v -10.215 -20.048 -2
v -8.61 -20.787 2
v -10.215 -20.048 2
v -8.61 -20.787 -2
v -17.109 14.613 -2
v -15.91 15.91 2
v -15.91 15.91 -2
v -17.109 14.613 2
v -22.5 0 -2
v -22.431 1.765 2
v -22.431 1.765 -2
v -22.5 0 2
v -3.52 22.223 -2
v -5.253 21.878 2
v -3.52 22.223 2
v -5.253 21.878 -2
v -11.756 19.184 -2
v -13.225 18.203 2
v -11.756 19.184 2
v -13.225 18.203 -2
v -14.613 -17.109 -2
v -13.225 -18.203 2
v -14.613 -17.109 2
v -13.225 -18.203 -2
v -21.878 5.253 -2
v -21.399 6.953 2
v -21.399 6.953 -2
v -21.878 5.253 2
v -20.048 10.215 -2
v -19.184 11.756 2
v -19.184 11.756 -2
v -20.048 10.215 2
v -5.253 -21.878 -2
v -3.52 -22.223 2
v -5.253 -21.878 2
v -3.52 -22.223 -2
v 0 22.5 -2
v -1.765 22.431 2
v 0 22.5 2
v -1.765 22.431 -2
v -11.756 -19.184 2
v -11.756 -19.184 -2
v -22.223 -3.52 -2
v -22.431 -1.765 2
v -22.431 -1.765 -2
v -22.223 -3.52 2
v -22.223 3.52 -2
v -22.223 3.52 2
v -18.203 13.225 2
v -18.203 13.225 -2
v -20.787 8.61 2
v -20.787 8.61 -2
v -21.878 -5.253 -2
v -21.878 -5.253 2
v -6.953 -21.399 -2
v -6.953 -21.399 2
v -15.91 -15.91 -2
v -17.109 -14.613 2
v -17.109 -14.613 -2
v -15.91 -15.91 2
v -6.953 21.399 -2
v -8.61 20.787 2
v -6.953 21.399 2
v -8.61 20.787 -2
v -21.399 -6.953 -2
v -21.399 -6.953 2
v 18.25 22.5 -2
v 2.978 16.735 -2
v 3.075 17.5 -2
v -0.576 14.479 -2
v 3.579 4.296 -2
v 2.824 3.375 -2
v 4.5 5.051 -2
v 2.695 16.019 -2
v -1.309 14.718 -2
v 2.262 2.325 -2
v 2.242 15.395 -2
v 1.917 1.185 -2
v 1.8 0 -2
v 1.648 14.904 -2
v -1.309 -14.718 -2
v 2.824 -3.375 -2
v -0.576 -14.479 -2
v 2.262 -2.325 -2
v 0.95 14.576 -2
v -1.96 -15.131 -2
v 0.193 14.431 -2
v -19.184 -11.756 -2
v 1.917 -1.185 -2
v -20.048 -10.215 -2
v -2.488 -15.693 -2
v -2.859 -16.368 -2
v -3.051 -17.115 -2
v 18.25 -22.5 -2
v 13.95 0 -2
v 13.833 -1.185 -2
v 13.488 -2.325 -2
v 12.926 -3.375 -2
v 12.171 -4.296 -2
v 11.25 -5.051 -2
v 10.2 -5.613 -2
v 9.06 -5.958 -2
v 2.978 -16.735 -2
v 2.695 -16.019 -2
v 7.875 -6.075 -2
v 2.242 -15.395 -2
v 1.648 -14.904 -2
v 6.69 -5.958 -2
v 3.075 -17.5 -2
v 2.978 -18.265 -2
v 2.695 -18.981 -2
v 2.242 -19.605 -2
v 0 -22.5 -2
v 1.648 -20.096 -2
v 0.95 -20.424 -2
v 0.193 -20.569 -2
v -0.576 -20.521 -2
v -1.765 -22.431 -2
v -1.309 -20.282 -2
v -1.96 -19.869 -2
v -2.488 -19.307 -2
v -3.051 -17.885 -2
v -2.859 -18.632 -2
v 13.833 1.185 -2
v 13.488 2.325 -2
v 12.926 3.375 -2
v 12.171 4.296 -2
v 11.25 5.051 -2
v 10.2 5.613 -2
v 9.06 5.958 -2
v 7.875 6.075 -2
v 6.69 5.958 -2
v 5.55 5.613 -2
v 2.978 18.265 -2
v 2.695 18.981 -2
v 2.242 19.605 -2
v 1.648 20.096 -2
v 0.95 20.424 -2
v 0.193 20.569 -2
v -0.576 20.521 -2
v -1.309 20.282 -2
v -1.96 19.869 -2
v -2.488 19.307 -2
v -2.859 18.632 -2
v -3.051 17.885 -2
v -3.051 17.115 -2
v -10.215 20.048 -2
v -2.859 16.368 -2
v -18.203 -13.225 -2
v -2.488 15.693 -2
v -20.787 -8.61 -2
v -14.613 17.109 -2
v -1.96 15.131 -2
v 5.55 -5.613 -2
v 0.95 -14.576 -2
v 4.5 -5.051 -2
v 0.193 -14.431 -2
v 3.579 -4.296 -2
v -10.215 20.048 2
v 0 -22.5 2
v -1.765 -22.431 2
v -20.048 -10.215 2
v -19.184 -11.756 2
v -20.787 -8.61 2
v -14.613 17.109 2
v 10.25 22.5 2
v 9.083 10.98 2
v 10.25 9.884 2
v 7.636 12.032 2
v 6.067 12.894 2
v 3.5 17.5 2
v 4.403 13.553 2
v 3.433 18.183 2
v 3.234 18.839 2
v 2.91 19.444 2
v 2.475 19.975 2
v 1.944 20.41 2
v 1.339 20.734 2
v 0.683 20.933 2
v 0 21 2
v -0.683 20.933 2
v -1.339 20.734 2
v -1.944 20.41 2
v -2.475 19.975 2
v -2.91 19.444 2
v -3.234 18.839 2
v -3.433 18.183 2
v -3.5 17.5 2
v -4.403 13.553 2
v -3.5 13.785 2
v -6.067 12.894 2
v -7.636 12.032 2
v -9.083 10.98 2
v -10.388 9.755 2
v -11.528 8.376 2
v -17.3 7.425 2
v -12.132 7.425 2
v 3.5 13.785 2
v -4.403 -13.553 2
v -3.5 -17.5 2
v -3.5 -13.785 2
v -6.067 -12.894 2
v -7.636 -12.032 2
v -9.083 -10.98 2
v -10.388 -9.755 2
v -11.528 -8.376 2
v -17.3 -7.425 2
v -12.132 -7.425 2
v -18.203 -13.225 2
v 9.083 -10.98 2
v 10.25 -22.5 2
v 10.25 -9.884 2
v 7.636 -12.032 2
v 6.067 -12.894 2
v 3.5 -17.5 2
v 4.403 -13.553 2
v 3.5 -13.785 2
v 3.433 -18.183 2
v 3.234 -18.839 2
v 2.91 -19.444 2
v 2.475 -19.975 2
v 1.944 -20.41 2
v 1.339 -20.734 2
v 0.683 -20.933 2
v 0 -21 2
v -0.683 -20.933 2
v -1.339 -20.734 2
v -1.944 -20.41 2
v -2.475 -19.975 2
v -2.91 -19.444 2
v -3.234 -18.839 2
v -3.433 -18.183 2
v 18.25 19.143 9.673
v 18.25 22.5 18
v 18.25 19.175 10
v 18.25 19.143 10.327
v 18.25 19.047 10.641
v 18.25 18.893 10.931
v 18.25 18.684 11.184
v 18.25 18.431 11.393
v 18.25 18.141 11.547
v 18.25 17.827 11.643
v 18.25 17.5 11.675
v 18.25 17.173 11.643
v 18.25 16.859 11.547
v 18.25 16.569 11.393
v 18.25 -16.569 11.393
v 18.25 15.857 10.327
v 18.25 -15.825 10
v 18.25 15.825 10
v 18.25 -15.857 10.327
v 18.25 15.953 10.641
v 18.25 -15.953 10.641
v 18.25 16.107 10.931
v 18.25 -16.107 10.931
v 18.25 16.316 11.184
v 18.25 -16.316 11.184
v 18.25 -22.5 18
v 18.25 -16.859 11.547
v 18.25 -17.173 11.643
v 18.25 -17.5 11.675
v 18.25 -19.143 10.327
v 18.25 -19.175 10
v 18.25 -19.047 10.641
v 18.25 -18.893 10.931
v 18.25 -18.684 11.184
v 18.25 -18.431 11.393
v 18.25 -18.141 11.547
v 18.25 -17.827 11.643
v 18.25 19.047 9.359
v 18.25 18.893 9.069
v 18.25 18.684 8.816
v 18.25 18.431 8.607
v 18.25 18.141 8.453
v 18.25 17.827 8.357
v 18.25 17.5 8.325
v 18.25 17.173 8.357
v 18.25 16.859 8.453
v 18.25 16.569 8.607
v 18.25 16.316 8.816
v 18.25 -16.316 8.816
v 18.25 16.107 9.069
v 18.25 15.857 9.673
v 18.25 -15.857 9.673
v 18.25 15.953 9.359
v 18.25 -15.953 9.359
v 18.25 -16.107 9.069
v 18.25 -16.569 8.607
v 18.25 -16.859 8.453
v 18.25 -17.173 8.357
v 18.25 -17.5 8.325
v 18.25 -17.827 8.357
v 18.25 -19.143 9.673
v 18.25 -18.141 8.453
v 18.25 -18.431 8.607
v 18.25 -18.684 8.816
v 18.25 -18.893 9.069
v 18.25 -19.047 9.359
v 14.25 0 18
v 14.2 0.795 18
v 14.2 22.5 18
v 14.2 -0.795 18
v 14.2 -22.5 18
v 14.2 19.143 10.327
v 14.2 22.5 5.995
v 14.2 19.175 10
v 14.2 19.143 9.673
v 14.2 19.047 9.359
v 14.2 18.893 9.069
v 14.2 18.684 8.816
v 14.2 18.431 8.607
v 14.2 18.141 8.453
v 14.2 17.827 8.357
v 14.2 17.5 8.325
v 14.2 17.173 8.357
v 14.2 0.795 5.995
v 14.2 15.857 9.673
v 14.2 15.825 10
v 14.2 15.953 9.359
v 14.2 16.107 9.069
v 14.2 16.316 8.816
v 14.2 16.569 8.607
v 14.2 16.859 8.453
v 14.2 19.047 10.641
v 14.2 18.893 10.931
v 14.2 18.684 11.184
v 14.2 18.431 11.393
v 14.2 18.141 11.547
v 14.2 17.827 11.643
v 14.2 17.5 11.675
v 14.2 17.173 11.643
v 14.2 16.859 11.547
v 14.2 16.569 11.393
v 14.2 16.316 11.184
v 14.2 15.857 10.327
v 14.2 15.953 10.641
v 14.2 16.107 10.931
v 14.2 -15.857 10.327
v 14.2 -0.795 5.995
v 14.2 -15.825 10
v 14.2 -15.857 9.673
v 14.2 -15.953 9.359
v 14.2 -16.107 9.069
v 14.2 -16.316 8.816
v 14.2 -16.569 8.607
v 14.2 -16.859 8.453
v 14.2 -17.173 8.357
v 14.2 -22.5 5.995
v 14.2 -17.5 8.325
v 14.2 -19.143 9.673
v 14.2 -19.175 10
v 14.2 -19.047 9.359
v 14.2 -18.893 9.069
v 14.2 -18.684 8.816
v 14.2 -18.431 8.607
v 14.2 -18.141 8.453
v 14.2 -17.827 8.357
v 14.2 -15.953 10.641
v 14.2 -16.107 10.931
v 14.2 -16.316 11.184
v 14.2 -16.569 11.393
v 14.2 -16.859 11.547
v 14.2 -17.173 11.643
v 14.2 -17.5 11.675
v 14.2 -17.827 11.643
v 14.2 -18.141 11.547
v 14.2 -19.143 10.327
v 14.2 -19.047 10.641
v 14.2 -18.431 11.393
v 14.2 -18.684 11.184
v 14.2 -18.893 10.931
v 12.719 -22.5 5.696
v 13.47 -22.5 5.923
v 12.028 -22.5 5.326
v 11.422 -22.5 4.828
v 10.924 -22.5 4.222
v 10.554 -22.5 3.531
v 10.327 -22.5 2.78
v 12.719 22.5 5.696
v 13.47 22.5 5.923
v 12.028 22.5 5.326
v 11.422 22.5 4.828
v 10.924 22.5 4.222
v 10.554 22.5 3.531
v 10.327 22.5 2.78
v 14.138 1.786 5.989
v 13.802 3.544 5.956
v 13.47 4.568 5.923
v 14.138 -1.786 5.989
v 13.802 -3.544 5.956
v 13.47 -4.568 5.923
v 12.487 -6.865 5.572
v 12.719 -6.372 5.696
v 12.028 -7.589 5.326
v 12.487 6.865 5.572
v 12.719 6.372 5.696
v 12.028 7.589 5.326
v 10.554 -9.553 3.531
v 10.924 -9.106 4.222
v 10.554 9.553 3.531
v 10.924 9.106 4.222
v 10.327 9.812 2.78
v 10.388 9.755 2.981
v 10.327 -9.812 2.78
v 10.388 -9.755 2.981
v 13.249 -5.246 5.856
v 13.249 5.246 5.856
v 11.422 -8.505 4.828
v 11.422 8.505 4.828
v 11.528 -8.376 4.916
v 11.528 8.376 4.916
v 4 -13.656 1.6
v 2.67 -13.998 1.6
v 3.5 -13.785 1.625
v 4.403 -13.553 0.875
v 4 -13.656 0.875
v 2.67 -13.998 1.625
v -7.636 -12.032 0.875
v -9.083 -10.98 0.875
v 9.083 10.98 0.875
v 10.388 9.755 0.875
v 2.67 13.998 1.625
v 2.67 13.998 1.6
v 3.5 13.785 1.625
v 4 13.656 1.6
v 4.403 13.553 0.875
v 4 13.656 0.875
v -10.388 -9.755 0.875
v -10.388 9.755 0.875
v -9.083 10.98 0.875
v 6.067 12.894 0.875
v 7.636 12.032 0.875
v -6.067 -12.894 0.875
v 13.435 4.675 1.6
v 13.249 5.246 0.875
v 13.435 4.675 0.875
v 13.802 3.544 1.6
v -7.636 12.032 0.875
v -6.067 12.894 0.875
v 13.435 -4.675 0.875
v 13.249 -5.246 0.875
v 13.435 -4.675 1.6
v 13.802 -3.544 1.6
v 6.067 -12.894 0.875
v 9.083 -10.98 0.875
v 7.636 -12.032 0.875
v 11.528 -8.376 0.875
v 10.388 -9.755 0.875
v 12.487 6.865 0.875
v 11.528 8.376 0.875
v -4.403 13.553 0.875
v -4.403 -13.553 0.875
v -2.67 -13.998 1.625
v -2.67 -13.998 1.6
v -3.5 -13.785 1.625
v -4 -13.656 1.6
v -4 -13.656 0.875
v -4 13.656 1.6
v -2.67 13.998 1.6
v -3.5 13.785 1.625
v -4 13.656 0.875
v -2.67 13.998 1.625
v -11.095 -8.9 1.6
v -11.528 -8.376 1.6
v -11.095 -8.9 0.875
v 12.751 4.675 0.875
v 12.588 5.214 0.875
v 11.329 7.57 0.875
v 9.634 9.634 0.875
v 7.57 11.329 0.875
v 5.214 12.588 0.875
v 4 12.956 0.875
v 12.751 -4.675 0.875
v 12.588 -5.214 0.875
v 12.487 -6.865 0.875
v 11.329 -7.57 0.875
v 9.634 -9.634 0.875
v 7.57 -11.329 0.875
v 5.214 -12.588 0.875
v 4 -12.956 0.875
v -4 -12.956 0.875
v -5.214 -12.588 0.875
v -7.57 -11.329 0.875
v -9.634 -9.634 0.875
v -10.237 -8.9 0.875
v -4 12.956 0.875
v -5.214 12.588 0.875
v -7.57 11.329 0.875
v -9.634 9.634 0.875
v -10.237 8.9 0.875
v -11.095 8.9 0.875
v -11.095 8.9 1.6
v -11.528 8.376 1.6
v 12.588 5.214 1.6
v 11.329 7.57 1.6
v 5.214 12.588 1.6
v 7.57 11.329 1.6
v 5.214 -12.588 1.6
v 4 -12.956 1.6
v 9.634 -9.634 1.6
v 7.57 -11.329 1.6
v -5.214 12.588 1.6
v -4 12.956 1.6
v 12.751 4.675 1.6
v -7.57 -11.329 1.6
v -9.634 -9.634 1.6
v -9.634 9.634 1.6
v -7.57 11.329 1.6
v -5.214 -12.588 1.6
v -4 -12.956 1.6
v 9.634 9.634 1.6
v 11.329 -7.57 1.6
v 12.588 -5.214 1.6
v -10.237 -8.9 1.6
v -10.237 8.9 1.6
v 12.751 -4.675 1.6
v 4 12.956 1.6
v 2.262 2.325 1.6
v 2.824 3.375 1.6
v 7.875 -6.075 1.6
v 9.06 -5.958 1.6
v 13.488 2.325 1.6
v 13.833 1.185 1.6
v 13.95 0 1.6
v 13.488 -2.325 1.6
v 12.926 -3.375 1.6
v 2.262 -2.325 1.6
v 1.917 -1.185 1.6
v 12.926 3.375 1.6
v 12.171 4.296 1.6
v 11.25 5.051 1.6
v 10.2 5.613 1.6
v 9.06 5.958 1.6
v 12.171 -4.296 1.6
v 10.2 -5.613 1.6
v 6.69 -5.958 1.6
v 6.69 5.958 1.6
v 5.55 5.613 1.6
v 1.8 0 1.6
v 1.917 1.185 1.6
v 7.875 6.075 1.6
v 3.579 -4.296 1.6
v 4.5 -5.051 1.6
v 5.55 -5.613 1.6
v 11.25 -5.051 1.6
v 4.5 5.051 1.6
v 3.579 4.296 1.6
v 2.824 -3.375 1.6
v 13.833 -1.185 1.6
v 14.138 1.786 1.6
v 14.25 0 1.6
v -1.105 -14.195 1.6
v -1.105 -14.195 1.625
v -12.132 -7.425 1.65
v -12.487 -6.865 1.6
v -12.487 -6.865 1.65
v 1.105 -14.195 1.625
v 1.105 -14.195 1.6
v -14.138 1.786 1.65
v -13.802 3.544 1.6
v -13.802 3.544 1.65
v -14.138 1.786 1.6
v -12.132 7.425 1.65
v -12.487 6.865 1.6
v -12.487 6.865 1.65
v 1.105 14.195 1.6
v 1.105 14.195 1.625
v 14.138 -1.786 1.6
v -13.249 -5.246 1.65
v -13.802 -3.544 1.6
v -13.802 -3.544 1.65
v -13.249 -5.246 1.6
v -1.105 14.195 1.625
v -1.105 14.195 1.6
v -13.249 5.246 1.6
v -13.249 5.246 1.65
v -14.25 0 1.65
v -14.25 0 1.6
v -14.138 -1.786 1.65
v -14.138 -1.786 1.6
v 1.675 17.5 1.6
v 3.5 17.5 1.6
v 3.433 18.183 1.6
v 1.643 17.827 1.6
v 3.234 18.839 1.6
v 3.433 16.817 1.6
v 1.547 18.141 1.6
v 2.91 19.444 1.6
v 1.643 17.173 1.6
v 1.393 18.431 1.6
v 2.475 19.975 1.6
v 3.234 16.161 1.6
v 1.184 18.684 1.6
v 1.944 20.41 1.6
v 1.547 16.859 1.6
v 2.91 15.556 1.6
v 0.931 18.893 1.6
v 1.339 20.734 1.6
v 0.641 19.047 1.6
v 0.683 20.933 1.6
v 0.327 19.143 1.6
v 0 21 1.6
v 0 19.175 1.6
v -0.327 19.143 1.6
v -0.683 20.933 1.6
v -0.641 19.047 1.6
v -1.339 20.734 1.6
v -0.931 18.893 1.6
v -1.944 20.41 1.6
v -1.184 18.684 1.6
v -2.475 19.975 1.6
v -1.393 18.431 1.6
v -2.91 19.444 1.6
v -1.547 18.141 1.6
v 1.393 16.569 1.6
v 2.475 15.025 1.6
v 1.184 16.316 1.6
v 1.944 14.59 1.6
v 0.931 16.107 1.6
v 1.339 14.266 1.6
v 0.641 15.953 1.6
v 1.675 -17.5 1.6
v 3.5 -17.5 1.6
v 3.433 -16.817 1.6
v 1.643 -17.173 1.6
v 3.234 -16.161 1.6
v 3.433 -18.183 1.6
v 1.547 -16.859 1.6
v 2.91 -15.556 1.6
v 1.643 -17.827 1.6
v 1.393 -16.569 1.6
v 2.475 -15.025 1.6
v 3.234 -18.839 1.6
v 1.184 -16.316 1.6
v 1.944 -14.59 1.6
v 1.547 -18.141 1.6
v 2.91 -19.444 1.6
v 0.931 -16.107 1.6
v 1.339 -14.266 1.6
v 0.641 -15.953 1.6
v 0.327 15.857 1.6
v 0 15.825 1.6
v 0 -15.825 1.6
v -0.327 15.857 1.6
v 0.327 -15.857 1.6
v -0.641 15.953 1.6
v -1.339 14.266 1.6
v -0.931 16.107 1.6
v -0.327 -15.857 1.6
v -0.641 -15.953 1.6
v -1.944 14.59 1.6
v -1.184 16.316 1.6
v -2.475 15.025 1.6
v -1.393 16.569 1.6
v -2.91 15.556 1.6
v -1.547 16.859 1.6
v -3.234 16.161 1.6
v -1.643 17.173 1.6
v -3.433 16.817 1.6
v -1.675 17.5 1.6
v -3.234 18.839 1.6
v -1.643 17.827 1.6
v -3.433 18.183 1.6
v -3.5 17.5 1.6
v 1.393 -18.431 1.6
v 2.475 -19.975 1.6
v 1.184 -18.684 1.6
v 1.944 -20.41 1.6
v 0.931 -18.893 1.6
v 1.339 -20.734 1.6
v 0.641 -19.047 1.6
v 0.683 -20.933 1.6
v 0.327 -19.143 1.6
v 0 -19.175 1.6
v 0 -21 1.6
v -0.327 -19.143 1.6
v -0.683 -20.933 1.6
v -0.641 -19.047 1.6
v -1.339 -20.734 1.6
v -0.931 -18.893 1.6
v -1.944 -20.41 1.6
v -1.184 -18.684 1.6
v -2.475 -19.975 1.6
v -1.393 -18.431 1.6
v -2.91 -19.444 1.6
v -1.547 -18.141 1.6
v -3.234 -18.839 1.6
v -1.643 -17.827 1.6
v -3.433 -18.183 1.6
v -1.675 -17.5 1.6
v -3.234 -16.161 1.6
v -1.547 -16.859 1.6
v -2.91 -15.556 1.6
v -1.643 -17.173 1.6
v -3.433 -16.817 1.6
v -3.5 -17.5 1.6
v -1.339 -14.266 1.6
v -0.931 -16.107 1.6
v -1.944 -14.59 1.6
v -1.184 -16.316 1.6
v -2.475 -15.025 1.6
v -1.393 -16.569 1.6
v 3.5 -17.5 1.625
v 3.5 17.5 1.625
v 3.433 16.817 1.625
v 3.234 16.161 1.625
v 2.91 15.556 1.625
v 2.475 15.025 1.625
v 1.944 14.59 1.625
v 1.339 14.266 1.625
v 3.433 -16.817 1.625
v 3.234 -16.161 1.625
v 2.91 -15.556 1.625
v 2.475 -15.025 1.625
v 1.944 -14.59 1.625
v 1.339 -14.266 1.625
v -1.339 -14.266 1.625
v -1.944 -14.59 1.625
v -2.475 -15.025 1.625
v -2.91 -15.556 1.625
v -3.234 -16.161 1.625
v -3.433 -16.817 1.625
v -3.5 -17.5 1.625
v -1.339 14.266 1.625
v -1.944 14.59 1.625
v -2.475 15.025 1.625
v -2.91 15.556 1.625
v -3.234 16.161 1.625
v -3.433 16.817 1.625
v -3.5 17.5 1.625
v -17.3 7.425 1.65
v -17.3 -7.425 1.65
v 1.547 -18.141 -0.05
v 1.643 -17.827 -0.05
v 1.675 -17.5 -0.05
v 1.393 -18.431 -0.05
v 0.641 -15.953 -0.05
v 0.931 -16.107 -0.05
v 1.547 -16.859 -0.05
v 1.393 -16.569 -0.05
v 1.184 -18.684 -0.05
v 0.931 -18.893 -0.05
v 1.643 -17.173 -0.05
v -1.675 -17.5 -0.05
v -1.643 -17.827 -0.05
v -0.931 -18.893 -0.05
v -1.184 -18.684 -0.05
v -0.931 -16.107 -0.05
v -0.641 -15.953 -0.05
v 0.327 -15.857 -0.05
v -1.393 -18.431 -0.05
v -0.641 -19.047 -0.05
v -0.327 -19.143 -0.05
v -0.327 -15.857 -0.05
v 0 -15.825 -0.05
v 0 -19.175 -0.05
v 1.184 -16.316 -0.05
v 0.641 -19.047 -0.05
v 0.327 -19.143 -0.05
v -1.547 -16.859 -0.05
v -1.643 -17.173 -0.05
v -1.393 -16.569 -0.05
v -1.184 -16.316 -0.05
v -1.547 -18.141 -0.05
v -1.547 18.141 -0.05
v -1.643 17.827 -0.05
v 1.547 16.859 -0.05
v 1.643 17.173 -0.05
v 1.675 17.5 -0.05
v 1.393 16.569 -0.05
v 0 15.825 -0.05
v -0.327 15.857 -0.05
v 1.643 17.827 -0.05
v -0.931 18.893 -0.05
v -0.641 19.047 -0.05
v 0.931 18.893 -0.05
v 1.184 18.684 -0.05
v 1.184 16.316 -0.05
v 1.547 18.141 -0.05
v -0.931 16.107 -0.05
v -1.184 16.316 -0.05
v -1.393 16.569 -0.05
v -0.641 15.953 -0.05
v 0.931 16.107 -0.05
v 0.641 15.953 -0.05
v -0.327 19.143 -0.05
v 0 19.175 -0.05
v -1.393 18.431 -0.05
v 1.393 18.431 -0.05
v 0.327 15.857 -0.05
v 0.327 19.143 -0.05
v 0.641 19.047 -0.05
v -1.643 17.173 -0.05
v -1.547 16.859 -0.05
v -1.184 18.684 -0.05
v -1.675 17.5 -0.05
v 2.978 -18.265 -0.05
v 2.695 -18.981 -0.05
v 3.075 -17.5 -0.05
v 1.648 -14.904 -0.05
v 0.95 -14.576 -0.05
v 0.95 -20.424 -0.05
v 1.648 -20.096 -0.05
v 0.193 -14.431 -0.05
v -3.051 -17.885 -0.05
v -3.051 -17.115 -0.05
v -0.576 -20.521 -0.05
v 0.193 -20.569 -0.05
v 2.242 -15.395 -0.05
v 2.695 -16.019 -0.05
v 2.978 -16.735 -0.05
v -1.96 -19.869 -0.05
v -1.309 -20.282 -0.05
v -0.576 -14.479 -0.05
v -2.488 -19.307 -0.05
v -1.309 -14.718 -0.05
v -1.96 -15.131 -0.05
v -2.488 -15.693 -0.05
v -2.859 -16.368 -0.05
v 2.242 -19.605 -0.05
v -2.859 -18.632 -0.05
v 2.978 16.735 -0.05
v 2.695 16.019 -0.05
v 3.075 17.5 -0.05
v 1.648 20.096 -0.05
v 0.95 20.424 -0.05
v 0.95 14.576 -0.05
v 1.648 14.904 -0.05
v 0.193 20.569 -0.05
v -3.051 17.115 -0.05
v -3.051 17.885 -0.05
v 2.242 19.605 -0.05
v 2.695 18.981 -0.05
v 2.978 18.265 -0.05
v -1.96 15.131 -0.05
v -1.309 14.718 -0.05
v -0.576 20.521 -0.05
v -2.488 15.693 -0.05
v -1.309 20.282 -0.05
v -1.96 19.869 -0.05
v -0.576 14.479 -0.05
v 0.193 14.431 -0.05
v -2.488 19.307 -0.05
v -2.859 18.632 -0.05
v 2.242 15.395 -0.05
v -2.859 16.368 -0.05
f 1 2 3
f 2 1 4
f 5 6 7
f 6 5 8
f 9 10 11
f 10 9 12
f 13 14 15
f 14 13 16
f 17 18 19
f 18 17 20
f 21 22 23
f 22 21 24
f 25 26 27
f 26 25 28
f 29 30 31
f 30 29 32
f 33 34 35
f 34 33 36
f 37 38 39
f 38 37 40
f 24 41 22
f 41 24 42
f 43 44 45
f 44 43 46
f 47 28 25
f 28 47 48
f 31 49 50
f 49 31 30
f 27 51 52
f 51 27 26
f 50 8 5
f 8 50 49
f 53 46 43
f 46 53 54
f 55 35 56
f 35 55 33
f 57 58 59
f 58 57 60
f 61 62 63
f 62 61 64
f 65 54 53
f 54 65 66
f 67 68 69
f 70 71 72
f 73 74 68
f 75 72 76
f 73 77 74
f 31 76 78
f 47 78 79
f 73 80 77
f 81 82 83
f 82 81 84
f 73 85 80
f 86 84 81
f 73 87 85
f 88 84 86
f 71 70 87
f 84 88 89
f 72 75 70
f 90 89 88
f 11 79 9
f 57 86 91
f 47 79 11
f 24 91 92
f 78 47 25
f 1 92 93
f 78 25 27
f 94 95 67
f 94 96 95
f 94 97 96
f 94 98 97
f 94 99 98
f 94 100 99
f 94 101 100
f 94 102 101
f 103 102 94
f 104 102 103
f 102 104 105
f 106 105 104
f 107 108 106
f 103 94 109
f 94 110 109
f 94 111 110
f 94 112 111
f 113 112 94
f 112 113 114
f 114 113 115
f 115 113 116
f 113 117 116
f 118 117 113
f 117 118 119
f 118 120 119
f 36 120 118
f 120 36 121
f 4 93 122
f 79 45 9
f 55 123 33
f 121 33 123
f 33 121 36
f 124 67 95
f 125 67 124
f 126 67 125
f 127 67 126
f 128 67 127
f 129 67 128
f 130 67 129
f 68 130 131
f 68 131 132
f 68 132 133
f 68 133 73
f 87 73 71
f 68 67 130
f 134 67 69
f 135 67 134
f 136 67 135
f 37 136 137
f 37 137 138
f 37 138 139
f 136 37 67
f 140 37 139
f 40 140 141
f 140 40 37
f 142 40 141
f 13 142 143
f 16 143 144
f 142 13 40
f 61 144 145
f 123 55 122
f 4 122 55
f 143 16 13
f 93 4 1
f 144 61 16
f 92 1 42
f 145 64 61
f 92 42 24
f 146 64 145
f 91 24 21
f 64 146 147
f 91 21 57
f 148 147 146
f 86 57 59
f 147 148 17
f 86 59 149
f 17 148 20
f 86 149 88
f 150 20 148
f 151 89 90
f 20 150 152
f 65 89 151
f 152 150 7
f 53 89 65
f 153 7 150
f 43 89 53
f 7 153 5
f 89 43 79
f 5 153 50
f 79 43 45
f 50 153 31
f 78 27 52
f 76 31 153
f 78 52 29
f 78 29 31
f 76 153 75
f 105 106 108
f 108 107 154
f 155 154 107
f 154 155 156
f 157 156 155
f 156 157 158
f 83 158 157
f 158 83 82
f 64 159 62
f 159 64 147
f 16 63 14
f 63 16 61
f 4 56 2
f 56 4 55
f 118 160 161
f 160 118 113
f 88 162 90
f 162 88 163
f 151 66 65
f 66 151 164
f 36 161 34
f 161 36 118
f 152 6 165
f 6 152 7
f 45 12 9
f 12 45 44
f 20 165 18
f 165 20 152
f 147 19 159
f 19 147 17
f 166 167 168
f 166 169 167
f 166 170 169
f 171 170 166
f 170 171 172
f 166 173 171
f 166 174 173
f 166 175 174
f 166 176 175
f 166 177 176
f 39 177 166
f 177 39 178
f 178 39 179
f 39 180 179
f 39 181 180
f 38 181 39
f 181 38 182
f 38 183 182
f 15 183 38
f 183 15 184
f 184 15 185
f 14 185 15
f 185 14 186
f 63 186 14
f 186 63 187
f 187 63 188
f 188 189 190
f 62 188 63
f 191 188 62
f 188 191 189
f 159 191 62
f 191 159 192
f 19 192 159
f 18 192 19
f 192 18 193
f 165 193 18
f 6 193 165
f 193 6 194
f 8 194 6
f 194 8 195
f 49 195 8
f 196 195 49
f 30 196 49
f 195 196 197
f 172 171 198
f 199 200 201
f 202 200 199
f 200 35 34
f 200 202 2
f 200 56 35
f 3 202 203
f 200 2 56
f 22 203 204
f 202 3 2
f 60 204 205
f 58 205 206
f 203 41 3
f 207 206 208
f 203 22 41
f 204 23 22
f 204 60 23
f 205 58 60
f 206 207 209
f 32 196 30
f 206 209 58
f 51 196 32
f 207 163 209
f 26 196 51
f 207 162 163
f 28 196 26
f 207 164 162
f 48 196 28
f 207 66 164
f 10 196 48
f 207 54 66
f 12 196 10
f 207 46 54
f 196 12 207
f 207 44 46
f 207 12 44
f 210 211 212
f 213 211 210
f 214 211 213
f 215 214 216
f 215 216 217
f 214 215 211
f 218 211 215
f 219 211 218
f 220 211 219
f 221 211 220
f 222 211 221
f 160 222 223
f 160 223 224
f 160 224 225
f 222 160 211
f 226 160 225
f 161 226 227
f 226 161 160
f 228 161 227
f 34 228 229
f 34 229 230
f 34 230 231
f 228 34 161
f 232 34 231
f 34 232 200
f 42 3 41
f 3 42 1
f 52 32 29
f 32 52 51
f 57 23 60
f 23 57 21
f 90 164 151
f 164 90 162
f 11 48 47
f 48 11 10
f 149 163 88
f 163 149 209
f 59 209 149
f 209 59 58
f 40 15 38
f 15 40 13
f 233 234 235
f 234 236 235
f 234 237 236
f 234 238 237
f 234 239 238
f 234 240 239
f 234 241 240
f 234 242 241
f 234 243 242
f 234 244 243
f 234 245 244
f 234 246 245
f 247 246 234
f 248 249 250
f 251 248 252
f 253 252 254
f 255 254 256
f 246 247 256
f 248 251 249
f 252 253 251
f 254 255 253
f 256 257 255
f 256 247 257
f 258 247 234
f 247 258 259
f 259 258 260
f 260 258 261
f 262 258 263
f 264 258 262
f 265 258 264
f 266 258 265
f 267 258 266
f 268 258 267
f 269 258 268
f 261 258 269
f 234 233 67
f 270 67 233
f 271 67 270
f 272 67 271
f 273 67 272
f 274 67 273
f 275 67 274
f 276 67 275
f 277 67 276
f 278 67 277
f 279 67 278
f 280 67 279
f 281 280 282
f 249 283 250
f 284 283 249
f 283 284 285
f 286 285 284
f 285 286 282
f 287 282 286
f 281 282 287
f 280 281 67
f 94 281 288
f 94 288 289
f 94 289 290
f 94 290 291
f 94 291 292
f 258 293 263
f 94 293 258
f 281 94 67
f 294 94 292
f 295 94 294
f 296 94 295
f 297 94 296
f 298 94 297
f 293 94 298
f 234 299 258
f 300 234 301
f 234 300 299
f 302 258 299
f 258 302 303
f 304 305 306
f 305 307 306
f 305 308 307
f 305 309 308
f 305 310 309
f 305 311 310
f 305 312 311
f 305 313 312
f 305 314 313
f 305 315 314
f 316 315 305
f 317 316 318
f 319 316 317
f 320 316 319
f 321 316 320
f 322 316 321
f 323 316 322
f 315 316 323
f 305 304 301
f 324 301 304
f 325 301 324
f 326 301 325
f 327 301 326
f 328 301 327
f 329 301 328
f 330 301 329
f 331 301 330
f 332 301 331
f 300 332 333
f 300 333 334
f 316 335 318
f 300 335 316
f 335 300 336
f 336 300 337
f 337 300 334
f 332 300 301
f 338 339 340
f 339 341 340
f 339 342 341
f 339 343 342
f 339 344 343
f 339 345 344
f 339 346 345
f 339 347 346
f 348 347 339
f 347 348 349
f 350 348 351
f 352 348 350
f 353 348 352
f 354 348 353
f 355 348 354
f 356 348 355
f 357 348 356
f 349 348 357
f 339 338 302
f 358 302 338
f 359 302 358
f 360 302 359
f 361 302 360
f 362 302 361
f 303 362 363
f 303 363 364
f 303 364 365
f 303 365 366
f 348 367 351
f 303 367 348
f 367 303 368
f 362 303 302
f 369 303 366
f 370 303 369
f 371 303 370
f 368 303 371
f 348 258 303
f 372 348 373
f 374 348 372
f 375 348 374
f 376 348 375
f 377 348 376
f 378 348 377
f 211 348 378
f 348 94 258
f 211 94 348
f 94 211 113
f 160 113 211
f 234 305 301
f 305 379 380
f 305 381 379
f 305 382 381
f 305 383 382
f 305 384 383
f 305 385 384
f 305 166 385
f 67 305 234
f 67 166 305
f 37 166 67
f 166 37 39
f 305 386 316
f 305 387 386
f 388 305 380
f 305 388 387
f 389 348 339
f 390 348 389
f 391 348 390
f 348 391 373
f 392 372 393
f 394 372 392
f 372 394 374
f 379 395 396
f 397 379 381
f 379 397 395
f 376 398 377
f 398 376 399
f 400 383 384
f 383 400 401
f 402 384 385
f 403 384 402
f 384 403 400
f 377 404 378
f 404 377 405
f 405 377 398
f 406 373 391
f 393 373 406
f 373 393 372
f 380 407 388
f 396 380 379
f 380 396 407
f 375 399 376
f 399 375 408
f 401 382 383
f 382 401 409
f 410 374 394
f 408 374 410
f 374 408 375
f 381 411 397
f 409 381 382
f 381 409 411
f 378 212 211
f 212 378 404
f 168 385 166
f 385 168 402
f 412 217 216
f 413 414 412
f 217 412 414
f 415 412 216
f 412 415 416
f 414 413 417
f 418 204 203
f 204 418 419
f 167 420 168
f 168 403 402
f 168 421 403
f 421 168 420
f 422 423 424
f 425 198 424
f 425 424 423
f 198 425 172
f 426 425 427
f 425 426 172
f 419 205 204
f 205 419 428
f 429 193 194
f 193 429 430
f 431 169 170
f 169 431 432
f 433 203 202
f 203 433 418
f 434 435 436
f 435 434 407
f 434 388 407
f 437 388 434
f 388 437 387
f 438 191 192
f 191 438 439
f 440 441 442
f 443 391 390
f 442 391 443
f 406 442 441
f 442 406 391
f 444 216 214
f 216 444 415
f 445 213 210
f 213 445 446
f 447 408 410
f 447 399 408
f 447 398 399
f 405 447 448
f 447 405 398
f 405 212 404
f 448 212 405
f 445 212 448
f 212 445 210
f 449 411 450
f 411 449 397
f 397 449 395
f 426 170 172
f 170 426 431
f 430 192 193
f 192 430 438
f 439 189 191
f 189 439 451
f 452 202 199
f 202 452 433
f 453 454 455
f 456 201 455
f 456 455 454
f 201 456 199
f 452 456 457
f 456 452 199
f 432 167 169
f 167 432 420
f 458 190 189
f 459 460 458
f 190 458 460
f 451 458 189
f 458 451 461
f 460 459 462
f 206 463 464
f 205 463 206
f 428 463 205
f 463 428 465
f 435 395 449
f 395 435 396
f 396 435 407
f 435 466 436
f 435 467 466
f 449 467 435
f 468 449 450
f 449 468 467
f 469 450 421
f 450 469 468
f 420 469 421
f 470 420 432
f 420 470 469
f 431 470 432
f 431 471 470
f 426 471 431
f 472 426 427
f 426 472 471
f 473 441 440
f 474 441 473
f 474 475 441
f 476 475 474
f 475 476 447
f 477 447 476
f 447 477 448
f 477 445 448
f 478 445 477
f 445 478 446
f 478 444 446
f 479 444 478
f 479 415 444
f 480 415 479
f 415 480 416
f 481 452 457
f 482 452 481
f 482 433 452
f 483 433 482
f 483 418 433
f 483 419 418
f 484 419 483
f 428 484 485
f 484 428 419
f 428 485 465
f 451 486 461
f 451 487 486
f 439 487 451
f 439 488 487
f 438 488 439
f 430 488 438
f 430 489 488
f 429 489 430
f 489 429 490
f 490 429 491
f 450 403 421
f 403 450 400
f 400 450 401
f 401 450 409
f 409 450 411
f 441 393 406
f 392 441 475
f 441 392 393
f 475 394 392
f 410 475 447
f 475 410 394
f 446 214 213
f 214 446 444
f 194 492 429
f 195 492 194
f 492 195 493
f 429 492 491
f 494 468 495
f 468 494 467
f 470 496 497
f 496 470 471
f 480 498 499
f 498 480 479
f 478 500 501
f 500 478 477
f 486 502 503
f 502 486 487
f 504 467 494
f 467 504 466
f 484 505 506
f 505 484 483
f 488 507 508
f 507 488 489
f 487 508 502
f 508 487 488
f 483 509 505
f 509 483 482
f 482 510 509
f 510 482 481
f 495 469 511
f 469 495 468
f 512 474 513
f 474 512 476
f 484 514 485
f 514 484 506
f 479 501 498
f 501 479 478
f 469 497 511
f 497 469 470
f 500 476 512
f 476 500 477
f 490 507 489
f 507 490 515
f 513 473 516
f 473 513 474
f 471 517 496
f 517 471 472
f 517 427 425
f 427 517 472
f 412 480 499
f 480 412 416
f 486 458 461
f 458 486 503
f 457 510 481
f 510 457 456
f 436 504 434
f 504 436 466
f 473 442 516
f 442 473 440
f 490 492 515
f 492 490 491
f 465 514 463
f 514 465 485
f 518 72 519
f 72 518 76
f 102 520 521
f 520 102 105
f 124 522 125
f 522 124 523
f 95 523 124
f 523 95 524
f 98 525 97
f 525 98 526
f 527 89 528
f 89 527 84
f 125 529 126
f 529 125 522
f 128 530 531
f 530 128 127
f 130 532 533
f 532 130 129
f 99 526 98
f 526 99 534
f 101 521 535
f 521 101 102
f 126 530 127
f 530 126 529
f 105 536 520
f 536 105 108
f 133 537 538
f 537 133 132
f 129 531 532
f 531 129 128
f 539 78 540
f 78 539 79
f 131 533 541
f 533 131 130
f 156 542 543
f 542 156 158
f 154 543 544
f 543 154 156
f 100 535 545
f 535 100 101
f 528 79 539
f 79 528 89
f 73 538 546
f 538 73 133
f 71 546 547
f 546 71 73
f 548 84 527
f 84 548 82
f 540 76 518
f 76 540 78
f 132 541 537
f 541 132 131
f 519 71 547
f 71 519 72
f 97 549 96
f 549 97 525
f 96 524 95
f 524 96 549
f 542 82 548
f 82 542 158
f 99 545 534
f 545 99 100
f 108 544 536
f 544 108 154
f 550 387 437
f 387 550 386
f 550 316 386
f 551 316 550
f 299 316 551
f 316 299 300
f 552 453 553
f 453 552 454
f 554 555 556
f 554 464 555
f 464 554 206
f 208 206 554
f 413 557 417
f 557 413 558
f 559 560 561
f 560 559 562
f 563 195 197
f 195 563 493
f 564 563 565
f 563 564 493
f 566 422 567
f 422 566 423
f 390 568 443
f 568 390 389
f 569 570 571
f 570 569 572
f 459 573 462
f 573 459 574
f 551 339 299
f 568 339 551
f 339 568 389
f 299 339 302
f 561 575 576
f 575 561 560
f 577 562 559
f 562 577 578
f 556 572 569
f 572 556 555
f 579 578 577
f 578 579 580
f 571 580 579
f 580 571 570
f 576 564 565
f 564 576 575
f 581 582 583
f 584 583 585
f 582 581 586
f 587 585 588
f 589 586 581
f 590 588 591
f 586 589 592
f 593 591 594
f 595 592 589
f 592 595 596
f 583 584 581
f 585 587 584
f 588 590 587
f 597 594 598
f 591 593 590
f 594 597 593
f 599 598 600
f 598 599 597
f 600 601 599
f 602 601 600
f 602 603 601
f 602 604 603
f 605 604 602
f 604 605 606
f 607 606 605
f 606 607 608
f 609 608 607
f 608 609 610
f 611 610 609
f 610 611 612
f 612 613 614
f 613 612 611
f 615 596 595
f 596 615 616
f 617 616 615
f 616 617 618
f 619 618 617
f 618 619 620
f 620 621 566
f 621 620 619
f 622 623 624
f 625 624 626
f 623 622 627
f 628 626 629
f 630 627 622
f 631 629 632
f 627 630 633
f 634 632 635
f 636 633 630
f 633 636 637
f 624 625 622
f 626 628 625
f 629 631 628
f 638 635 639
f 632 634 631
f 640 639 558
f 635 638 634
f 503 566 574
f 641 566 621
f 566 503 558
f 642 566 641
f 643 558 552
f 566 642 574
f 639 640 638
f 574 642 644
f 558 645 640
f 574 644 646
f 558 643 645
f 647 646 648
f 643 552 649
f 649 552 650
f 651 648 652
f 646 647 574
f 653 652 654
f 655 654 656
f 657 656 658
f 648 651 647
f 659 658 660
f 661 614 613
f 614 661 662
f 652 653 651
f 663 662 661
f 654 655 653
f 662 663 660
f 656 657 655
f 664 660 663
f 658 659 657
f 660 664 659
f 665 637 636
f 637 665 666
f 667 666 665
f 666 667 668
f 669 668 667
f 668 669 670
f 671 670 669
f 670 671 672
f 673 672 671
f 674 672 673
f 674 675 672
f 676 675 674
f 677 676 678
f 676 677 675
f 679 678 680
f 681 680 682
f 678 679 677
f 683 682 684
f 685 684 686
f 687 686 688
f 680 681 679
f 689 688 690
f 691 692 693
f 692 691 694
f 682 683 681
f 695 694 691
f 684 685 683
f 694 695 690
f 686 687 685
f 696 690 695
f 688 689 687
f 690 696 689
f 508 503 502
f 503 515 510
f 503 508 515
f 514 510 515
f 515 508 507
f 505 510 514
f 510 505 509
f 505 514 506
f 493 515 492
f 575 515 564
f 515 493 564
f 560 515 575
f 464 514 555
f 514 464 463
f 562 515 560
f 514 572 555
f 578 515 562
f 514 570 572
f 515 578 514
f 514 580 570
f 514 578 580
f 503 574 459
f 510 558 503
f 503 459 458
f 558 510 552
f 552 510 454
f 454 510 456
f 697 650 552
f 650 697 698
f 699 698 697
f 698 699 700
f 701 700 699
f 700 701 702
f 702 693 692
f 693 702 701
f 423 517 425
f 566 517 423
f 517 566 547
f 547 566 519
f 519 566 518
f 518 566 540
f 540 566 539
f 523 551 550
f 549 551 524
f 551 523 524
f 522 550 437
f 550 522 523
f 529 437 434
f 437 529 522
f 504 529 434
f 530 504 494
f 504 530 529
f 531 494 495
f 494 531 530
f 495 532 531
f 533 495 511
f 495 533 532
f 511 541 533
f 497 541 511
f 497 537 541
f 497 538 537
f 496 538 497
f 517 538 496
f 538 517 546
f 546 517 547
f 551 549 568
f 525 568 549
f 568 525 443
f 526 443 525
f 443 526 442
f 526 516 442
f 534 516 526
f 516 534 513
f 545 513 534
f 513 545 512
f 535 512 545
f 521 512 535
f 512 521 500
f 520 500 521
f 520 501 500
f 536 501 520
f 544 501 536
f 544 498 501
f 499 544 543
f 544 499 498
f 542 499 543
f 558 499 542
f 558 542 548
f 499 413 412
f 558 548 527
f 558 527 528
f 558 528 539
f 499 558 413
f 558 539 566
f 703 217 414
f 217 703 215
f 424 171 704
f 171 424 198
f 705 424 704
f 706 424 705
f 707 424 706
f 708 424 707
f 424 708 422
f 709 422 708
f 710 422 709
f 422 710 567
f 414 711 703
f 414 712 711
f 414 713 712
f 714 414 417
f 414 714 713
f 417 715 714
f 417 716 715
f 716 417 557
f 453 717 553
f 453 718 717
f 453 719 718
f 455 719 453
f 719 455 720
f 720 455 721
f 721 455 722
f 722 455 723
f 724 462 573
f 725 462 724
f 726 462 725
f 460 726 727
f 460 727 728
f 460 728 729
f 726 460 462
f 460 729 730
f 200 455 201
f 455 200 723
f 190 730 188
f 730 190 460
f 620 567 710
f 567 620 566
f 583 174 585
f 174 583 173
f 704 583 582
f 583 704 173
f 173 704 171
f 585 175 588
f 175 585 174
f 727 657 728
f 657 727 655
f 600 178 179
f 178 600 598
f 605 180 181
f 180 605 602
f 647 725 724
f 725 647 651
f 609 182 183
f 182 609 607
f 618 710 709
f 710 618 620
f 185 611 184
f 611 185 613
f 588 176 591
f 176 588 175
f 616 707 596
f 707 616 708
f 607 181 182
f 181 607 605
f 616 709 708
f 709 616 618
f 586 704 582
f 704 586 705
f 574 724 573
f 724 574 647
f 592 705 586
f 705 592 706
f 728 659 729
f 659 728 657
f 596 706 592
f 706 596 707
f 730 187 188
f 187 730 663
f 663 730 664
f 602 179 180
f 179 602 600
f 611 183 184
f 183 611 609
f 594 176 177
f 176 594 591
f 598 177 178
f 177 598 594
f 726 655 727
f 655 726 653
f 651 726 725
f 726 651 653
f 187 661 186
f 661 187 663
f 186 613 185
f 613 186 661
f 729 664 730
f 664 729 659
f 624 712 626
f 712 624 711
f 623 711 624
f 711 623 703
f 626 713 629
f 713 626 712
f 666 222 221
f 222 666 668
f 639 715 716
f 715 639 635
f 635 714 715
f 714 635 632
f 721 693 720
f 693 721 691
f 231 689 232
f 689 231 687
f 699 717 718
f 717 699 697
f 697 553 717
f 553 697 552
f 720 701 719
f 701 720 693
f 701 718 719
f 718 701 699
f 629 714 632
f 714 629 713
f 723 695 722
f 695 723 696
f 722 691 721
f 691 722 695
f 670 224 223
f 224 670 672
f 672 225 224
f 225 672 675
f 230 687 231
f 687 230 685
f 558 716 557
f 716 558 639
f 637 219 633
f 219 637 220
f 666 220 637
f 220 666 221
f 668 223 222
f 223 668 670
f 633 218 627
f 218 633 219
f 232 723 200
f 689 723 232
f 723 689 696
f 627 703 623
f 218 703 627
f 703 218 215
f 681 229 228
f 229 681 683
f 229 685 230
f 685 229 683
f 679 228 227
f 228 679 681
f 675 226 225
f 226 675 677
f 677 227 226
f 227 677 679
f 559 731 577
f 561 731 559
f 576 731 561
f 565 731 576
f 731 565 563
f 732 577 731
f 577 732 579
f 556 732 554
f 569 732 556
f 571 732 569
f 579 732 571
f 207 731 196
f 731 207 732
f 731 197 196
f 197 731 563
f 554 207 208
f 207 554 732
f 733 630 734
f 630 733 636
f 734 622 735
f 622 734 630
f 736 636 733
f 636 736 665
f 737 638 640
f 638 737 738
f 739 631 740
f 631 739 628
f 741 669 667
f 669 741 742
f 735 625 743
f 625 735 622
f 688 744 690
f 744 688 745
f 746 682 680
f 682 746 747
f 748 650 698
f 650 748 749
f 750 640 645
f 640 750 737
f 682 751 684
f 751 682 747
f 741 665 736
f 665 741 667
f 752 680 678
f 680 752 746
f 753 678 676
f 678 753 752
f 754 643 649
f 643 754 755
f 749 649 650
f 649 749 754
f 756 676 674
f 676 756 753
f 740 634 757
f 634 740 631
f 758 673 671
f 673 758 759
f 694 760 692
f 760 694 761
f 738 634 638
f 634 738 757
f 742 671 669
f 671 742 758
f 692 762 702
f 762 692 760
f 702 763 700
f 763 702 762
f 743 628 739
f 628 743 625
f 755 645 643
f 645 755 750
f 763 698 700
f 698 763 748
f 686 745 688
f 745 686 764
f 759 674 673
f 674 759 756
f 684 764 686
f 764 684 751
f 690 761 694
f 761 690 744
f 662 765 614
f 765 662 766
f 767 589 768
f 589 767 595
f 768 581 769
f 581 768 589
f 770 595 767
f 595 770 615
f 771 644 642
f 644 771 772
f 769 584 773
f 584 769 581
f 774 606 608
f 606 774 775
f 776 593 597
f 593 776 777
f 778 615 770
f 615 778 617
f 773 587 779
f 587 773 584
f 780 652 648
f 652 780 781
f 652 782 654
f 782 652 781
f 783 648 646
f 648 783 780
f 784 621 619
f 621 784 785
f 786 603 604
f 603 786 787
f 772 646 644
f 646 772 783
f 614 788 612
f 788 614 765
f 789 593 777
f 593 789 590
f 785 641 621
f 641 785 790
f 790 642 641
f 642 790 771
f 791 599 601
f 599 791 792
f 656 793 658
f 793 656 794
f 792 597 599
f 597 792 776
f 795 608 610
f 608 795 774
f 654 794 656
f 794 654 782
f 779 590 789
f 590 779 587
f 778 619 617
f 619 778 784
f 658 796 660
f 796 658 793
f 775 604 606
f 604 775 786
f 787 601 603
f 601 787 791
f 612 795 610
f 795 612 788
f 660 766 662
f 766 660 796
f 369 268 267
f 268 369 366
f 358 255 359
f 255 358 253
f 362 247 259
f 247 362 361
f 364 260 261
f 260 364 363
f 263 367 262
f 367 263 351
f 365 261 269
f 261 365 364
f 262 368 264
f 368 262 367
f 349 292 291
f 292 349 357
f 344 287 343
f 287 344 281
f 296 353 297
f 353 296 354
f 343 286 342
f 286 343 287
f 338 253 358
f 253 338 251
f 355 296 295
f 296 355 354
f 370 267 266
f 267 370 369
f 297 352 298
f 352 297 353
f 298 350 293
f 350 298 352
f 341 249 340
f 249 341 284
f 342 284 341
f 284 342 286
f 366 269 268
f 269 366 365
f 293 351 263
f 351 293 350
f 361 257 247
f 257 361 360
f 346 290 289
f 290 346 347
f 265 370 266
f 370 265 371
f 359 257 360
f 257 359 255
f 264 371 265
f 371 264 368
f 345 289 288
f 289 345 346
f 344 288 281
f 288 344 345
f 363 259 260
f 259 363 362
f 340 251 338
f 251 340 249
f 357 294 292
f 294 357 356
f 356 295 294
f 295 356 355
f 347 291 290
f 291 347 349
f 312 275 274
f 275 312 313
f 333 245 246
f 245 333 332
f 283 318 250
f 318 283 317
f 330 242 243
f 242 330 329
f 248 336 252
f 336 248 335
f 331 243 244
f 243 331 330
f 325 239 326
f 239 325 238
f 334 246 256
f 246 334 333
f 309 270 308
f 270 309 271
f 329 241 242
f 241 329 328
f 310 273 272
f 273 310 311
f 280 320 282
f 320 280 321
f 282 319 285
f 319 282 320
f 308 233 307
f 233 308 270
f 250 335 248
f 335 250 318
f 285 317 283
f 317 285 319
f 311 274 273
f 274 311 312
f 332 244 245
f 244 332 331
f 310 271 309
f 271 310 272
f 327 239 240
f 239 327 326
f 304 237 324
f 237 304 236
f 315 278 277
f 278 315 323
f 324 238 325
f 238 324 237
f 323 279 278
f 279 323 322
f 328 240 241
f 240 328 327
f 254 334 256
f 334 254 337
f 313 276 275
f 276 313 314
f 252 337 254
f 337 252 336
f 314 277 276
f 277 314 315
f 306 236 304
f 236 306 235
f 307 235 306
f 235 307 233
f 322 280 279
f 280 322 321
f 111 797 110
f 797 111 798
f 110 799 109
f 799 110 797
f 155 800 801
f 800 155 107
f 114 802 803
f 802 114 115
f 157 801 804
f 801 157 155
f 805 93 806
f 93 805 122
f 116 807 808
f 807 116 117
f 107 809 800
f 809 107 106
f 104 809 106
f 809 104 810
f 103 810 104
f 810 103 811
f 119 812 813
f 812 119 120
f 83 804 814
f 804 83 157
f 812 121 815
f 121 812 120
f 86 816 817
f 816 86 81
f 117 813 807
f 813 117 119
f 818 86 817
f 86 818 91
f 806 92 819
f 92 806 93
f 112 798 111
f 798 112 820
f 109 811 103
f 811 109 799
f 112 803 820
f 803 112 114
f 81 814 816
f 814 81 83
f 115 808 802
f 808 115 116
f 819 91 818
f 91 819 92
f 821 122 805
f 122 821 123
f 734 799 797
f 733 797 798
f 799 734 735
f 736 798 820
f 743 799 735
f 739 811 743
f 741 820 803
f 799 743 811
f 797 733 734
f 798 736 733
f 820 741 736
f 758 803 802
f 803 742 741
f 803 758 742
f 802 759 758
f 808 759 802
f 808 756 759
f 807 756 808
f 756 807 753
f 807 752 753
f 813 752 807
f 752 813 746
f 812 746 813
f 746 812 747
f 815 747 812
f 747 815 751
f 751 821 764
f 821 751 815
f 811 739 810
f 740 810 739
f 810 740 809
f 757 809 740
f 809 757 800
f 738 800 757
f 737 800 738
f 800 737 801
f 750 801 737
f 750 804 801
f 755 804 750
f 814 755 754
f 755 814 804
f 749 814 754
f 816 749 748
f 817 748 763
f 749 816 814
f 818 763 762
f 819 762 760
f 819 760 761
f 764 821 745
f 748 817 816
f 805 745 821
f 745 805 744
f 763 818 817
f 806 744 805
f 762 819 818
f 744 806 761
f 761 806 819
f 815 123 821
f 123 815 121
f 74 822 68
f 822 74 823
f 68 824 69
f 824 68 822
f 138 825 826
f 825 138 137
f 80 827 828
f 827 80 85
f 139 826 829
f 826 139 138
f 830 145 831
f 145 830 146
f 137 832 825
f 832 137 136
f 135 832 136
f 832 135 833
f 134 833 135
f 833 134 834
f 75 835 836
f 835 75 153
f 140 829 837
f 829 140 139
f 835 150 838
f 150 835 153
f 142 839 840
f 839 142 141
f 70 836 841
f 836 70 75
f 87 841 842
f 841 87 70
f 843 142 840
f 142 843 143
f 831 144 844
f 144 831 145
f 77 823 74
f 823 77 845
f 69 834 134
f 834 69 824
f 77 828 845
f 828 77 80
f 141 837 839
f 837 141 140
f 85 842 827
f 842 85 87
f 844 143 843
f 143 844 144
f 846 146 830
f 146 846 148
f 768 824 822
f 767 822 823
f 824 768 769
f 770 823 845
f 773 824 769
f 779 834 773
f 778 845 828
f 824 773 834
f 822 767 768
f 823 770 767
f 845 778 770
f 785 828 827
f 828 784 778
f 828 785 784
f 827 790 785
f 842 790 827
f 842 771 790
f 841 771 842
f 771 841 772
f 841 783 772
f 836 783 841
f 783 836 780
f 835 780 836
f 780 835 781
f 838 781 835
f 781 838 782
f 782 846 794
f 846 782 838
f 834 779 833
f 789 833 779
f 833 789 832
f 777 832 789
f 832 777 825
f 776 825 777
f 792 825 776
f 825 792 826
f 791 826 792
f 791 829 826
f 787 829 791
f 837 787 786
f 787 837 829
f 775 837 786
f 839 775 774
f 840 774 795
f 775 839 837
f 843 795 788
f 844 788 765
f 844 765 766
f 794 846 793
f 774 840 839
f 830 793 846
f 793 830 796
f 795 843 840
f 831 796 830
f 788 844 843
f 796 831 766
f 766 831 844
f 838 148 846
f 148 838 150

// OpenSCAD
// Bracket for  28BYJ-48 stepper motor
// 28BYJ-48 model from RGriffoGoes www.thingiverse.com/thing:204734
// added details by J.Beale 21 July 2014
// Bracket by J.Beale 9 Aug 2014

slop = 0.25;  // printer tolerance

// =========================================================
// stepper motor body model

MBH = 18.8;   // motor body height
MBD = 28.25+slop;  // motor body OD
SBD = 9.1+slop;    // shaft boss OD
SBH = 1.45;   // shaft boss height above motor body
SBO = 7.875;  // offset of shaft/boss center from motor center
//SHD = 4.93+slop*2;   // motor shaft OD+ countersink for boss
SHD = 11.9+slop;   // motor shaft OD (larger clearance hole)
SHDF = 3.0;   // motor shaft diameter, across flats
SHHF = 6.0;   // motor shaft flats height, or depth in from end
SHHF = 0.0;   // assume round shaft for purposes of bracket
SHH = 9.75;   // height of shaft above motor body 

MBFH = 0.7;   // height of body edge flange protruding above surface
MBFW = 1.0+slop;   // width of edge flange
MBFNW = 8;    // width of notch in edge flange
MBFNW2 = 17.8;  // width of edge flange notch above wiring box

MHCC = 35.0;  // mounting hole center-to-center
MTH  = 0.8;   // mounting tab thickness
MTW  = 7.0;   // mounting tab width
// MTHID = 4.0;  // mounting tab hole inner diameter
MTHID = 3.0;  // mounting tab hole inner diameter
WBH  = 16.7;  // plastic wiring box height
WBW  = 14.6+slop;  // plastic wiring box width
WBD  = 31.3+slop;  // body diameter to outer surface of wiring box

WRD = 1.0;     // diameter of electrical wires
WRL = 30;      // length of electrical wires
WRO = 2.2;		// offset of wires below top motor surface
// =========================================================
// right-angle bracket for motor

MSOD = 5.9 + slop;  // M3 mounting screw head diameter
MSTH = 2.0;  // M3 screw head thickness (for countersink)
//MSTH = 0; // set to zero for no screwhead countersink
MSSD = 3.1 + slop;  // M3 screw diameter clearance hole
Bthick = 4;  // thickness of bracket
Bdia = (MHCC+10);  // diameter of bracket face

// =========================================================
fn = 80;
eps = 0.05;   // small number to avoid coincident faces


module StepMotor28BYJ()
{
  difference(){
    union(){
	   color("gray") translate([0,0,-(MBH+MBFH)/2])
		  difference() {  // flange at top rim
         cylinder(h = MBFH+eps, r = MBD/2, center = true, $fn = 50);
         cylinder(h = MBFH+2*eps, r = (MBD-MBFW)/2, center = true, $fn = 32);
			cube([MBFNW,MHCC,MBFH*2],center=true); // notches in rim
			cube([MBD+2*MBFW,SBD,MBFH*2],center=true);
		   translate([-MBD/2,0,0]) cube([MBD,MBFNW2,MBFH*2],center=true);
        }
		color("gray") // motor body
			cylinder(h = MBH, r = MBD/2, center = true, $fn = 50);
		color("gray") translate([SBO,0,-SBH])	// shaft boss
			cylinder(h = MBH, r = SBD/2, center = true, $fn = 32);

		translate([SBO,0,-SHH])	// motor shaft
        difference() {
			color("gold") cylinder(h = MBH, r = SHD/2, center = true, $fn = 32);
				// shaft flats
		   color("red") translate([(SHD+SHDF)/2,0,-(eps+MBH-SHHF)/2]) 
				cube([SHD,SHD,SHHF], center = true);
		   color("red") translate([-(SHD+SHDF)/2,0,-(eps+MBH-SHHF)/2]) 
				cube([SHD,SHD,SHHF], center = true);
        }


		color("Silver") translate([0,0,-(MBH-MTH-eps)/2]) // mounting tab 
			cube([MTW,MHCC,MTH], center = true);				
		color("Silver") translate([0,MHCC/2,-(MBH-MTH)/2]) // mt.tab rounded end
			cylinder(h = MTH, r = MTW/2, center = true, $fn = 32);
		color("Silver") translate([0,-MHCC/2,-(MBH-MTH)/2]) // mt.tab rounded end
			cylinder(h = MTH, r = MTW/2, center = true, $fn = 32);


		color("blue") translate([-(WBD-MBD),0,eps-(MBH-WBH)/2]) // plastic wire box
			cube([MBD,WBW,WBH], center = true);
	   color("blue") translate([-2,0,0])	
			cube([24.5,16,15], center = true);
		}

				// mounting holes in tabs on side
		color("red") translate([0,MHCC/2,-MBH/2])	
				cylinder(h = 2, r = MTHID/2, center = true, $fn = 32);
		color("red") translate([0,-MHCC/2,-MBH/2])	
				cylinder(h = 2, r = MTHID/2, center = true, $fn = 32);
		}
}

module MOT() {
 translate([0,0,-MBH/2]) 
 rotate([180,0,0]) StepMotor28BYJ();  // motor body (without wires)
}


module bracket() {
difference() {
 union() {
  translate([0,0,-2]) cylinder(h=Bthick, r=Bdia/2, $fn=fn);  // round face
  translate([-eps + MBD/2,-Bdia/2,-20+Bthick/2]) 
		cube([4+eps,Bdia,20]); // flange
  translate([-0,-Bdia/2,-Bthick/2]) 
	cube([Bdia,Bdia,Bthick]); // square edge joining round face to flange
  translate([MBD/2,Bdia/2,-Bthick/2]) rotate([90,0,0]) 
	cylinder(r=Bthick,h=Bdia,$fn=32); // round fillet at flange
 }
 union() {
   translate([4+MBD/2,-MBD,-MBD]) cube([MBD*2,MBD*2,MBD*2]);
   translate([0,MHCC/2,-10])	// motor mounting bolt
				cylinder(h = 30, r = MSSD/2, center = true, $fn = 32);
   translate([0,-MHCC/2,-10])	// motor mounting bole
				cylinder(h = 30, r = MSSD/2, center = true, $fn = 32);
   translate([10,MHCC/2,-10]) rotate([0,90,0]) 	// flange mounting bolt
				cylinder(h = 30, r = MSSD/2, center = true, $fn = 32);
   translate([10,-MHCC/2,-10]) rotate([0,90,0]) 	// flange mounting bolt
				cylinder(h = 30, r = MSSD/2, center = true, $fn = 32);

   color("white") translate([0,MHCC/2,((Bthick/2) - MSTH + eps)]) 
	 cylinder(r=MSOD/2, h=MSTH, $fn=25); // motor screw countersink
   color("white") translate([0,-MHCC/2,((Bthick/2) - MSTH + eps)])  
	 cylinder(r=MSOD/2, h=MSTH, $fn=25); // motor screw countersink

   translate([0,0,-1.6]) MOT(); // body of motor
   //translate([0,0,-10]) cube([50,50,50]); // DEBUG cutaway view
 }
}
} // end module()

rotate([180,0,0]) bracket();  // show the motor bracket
